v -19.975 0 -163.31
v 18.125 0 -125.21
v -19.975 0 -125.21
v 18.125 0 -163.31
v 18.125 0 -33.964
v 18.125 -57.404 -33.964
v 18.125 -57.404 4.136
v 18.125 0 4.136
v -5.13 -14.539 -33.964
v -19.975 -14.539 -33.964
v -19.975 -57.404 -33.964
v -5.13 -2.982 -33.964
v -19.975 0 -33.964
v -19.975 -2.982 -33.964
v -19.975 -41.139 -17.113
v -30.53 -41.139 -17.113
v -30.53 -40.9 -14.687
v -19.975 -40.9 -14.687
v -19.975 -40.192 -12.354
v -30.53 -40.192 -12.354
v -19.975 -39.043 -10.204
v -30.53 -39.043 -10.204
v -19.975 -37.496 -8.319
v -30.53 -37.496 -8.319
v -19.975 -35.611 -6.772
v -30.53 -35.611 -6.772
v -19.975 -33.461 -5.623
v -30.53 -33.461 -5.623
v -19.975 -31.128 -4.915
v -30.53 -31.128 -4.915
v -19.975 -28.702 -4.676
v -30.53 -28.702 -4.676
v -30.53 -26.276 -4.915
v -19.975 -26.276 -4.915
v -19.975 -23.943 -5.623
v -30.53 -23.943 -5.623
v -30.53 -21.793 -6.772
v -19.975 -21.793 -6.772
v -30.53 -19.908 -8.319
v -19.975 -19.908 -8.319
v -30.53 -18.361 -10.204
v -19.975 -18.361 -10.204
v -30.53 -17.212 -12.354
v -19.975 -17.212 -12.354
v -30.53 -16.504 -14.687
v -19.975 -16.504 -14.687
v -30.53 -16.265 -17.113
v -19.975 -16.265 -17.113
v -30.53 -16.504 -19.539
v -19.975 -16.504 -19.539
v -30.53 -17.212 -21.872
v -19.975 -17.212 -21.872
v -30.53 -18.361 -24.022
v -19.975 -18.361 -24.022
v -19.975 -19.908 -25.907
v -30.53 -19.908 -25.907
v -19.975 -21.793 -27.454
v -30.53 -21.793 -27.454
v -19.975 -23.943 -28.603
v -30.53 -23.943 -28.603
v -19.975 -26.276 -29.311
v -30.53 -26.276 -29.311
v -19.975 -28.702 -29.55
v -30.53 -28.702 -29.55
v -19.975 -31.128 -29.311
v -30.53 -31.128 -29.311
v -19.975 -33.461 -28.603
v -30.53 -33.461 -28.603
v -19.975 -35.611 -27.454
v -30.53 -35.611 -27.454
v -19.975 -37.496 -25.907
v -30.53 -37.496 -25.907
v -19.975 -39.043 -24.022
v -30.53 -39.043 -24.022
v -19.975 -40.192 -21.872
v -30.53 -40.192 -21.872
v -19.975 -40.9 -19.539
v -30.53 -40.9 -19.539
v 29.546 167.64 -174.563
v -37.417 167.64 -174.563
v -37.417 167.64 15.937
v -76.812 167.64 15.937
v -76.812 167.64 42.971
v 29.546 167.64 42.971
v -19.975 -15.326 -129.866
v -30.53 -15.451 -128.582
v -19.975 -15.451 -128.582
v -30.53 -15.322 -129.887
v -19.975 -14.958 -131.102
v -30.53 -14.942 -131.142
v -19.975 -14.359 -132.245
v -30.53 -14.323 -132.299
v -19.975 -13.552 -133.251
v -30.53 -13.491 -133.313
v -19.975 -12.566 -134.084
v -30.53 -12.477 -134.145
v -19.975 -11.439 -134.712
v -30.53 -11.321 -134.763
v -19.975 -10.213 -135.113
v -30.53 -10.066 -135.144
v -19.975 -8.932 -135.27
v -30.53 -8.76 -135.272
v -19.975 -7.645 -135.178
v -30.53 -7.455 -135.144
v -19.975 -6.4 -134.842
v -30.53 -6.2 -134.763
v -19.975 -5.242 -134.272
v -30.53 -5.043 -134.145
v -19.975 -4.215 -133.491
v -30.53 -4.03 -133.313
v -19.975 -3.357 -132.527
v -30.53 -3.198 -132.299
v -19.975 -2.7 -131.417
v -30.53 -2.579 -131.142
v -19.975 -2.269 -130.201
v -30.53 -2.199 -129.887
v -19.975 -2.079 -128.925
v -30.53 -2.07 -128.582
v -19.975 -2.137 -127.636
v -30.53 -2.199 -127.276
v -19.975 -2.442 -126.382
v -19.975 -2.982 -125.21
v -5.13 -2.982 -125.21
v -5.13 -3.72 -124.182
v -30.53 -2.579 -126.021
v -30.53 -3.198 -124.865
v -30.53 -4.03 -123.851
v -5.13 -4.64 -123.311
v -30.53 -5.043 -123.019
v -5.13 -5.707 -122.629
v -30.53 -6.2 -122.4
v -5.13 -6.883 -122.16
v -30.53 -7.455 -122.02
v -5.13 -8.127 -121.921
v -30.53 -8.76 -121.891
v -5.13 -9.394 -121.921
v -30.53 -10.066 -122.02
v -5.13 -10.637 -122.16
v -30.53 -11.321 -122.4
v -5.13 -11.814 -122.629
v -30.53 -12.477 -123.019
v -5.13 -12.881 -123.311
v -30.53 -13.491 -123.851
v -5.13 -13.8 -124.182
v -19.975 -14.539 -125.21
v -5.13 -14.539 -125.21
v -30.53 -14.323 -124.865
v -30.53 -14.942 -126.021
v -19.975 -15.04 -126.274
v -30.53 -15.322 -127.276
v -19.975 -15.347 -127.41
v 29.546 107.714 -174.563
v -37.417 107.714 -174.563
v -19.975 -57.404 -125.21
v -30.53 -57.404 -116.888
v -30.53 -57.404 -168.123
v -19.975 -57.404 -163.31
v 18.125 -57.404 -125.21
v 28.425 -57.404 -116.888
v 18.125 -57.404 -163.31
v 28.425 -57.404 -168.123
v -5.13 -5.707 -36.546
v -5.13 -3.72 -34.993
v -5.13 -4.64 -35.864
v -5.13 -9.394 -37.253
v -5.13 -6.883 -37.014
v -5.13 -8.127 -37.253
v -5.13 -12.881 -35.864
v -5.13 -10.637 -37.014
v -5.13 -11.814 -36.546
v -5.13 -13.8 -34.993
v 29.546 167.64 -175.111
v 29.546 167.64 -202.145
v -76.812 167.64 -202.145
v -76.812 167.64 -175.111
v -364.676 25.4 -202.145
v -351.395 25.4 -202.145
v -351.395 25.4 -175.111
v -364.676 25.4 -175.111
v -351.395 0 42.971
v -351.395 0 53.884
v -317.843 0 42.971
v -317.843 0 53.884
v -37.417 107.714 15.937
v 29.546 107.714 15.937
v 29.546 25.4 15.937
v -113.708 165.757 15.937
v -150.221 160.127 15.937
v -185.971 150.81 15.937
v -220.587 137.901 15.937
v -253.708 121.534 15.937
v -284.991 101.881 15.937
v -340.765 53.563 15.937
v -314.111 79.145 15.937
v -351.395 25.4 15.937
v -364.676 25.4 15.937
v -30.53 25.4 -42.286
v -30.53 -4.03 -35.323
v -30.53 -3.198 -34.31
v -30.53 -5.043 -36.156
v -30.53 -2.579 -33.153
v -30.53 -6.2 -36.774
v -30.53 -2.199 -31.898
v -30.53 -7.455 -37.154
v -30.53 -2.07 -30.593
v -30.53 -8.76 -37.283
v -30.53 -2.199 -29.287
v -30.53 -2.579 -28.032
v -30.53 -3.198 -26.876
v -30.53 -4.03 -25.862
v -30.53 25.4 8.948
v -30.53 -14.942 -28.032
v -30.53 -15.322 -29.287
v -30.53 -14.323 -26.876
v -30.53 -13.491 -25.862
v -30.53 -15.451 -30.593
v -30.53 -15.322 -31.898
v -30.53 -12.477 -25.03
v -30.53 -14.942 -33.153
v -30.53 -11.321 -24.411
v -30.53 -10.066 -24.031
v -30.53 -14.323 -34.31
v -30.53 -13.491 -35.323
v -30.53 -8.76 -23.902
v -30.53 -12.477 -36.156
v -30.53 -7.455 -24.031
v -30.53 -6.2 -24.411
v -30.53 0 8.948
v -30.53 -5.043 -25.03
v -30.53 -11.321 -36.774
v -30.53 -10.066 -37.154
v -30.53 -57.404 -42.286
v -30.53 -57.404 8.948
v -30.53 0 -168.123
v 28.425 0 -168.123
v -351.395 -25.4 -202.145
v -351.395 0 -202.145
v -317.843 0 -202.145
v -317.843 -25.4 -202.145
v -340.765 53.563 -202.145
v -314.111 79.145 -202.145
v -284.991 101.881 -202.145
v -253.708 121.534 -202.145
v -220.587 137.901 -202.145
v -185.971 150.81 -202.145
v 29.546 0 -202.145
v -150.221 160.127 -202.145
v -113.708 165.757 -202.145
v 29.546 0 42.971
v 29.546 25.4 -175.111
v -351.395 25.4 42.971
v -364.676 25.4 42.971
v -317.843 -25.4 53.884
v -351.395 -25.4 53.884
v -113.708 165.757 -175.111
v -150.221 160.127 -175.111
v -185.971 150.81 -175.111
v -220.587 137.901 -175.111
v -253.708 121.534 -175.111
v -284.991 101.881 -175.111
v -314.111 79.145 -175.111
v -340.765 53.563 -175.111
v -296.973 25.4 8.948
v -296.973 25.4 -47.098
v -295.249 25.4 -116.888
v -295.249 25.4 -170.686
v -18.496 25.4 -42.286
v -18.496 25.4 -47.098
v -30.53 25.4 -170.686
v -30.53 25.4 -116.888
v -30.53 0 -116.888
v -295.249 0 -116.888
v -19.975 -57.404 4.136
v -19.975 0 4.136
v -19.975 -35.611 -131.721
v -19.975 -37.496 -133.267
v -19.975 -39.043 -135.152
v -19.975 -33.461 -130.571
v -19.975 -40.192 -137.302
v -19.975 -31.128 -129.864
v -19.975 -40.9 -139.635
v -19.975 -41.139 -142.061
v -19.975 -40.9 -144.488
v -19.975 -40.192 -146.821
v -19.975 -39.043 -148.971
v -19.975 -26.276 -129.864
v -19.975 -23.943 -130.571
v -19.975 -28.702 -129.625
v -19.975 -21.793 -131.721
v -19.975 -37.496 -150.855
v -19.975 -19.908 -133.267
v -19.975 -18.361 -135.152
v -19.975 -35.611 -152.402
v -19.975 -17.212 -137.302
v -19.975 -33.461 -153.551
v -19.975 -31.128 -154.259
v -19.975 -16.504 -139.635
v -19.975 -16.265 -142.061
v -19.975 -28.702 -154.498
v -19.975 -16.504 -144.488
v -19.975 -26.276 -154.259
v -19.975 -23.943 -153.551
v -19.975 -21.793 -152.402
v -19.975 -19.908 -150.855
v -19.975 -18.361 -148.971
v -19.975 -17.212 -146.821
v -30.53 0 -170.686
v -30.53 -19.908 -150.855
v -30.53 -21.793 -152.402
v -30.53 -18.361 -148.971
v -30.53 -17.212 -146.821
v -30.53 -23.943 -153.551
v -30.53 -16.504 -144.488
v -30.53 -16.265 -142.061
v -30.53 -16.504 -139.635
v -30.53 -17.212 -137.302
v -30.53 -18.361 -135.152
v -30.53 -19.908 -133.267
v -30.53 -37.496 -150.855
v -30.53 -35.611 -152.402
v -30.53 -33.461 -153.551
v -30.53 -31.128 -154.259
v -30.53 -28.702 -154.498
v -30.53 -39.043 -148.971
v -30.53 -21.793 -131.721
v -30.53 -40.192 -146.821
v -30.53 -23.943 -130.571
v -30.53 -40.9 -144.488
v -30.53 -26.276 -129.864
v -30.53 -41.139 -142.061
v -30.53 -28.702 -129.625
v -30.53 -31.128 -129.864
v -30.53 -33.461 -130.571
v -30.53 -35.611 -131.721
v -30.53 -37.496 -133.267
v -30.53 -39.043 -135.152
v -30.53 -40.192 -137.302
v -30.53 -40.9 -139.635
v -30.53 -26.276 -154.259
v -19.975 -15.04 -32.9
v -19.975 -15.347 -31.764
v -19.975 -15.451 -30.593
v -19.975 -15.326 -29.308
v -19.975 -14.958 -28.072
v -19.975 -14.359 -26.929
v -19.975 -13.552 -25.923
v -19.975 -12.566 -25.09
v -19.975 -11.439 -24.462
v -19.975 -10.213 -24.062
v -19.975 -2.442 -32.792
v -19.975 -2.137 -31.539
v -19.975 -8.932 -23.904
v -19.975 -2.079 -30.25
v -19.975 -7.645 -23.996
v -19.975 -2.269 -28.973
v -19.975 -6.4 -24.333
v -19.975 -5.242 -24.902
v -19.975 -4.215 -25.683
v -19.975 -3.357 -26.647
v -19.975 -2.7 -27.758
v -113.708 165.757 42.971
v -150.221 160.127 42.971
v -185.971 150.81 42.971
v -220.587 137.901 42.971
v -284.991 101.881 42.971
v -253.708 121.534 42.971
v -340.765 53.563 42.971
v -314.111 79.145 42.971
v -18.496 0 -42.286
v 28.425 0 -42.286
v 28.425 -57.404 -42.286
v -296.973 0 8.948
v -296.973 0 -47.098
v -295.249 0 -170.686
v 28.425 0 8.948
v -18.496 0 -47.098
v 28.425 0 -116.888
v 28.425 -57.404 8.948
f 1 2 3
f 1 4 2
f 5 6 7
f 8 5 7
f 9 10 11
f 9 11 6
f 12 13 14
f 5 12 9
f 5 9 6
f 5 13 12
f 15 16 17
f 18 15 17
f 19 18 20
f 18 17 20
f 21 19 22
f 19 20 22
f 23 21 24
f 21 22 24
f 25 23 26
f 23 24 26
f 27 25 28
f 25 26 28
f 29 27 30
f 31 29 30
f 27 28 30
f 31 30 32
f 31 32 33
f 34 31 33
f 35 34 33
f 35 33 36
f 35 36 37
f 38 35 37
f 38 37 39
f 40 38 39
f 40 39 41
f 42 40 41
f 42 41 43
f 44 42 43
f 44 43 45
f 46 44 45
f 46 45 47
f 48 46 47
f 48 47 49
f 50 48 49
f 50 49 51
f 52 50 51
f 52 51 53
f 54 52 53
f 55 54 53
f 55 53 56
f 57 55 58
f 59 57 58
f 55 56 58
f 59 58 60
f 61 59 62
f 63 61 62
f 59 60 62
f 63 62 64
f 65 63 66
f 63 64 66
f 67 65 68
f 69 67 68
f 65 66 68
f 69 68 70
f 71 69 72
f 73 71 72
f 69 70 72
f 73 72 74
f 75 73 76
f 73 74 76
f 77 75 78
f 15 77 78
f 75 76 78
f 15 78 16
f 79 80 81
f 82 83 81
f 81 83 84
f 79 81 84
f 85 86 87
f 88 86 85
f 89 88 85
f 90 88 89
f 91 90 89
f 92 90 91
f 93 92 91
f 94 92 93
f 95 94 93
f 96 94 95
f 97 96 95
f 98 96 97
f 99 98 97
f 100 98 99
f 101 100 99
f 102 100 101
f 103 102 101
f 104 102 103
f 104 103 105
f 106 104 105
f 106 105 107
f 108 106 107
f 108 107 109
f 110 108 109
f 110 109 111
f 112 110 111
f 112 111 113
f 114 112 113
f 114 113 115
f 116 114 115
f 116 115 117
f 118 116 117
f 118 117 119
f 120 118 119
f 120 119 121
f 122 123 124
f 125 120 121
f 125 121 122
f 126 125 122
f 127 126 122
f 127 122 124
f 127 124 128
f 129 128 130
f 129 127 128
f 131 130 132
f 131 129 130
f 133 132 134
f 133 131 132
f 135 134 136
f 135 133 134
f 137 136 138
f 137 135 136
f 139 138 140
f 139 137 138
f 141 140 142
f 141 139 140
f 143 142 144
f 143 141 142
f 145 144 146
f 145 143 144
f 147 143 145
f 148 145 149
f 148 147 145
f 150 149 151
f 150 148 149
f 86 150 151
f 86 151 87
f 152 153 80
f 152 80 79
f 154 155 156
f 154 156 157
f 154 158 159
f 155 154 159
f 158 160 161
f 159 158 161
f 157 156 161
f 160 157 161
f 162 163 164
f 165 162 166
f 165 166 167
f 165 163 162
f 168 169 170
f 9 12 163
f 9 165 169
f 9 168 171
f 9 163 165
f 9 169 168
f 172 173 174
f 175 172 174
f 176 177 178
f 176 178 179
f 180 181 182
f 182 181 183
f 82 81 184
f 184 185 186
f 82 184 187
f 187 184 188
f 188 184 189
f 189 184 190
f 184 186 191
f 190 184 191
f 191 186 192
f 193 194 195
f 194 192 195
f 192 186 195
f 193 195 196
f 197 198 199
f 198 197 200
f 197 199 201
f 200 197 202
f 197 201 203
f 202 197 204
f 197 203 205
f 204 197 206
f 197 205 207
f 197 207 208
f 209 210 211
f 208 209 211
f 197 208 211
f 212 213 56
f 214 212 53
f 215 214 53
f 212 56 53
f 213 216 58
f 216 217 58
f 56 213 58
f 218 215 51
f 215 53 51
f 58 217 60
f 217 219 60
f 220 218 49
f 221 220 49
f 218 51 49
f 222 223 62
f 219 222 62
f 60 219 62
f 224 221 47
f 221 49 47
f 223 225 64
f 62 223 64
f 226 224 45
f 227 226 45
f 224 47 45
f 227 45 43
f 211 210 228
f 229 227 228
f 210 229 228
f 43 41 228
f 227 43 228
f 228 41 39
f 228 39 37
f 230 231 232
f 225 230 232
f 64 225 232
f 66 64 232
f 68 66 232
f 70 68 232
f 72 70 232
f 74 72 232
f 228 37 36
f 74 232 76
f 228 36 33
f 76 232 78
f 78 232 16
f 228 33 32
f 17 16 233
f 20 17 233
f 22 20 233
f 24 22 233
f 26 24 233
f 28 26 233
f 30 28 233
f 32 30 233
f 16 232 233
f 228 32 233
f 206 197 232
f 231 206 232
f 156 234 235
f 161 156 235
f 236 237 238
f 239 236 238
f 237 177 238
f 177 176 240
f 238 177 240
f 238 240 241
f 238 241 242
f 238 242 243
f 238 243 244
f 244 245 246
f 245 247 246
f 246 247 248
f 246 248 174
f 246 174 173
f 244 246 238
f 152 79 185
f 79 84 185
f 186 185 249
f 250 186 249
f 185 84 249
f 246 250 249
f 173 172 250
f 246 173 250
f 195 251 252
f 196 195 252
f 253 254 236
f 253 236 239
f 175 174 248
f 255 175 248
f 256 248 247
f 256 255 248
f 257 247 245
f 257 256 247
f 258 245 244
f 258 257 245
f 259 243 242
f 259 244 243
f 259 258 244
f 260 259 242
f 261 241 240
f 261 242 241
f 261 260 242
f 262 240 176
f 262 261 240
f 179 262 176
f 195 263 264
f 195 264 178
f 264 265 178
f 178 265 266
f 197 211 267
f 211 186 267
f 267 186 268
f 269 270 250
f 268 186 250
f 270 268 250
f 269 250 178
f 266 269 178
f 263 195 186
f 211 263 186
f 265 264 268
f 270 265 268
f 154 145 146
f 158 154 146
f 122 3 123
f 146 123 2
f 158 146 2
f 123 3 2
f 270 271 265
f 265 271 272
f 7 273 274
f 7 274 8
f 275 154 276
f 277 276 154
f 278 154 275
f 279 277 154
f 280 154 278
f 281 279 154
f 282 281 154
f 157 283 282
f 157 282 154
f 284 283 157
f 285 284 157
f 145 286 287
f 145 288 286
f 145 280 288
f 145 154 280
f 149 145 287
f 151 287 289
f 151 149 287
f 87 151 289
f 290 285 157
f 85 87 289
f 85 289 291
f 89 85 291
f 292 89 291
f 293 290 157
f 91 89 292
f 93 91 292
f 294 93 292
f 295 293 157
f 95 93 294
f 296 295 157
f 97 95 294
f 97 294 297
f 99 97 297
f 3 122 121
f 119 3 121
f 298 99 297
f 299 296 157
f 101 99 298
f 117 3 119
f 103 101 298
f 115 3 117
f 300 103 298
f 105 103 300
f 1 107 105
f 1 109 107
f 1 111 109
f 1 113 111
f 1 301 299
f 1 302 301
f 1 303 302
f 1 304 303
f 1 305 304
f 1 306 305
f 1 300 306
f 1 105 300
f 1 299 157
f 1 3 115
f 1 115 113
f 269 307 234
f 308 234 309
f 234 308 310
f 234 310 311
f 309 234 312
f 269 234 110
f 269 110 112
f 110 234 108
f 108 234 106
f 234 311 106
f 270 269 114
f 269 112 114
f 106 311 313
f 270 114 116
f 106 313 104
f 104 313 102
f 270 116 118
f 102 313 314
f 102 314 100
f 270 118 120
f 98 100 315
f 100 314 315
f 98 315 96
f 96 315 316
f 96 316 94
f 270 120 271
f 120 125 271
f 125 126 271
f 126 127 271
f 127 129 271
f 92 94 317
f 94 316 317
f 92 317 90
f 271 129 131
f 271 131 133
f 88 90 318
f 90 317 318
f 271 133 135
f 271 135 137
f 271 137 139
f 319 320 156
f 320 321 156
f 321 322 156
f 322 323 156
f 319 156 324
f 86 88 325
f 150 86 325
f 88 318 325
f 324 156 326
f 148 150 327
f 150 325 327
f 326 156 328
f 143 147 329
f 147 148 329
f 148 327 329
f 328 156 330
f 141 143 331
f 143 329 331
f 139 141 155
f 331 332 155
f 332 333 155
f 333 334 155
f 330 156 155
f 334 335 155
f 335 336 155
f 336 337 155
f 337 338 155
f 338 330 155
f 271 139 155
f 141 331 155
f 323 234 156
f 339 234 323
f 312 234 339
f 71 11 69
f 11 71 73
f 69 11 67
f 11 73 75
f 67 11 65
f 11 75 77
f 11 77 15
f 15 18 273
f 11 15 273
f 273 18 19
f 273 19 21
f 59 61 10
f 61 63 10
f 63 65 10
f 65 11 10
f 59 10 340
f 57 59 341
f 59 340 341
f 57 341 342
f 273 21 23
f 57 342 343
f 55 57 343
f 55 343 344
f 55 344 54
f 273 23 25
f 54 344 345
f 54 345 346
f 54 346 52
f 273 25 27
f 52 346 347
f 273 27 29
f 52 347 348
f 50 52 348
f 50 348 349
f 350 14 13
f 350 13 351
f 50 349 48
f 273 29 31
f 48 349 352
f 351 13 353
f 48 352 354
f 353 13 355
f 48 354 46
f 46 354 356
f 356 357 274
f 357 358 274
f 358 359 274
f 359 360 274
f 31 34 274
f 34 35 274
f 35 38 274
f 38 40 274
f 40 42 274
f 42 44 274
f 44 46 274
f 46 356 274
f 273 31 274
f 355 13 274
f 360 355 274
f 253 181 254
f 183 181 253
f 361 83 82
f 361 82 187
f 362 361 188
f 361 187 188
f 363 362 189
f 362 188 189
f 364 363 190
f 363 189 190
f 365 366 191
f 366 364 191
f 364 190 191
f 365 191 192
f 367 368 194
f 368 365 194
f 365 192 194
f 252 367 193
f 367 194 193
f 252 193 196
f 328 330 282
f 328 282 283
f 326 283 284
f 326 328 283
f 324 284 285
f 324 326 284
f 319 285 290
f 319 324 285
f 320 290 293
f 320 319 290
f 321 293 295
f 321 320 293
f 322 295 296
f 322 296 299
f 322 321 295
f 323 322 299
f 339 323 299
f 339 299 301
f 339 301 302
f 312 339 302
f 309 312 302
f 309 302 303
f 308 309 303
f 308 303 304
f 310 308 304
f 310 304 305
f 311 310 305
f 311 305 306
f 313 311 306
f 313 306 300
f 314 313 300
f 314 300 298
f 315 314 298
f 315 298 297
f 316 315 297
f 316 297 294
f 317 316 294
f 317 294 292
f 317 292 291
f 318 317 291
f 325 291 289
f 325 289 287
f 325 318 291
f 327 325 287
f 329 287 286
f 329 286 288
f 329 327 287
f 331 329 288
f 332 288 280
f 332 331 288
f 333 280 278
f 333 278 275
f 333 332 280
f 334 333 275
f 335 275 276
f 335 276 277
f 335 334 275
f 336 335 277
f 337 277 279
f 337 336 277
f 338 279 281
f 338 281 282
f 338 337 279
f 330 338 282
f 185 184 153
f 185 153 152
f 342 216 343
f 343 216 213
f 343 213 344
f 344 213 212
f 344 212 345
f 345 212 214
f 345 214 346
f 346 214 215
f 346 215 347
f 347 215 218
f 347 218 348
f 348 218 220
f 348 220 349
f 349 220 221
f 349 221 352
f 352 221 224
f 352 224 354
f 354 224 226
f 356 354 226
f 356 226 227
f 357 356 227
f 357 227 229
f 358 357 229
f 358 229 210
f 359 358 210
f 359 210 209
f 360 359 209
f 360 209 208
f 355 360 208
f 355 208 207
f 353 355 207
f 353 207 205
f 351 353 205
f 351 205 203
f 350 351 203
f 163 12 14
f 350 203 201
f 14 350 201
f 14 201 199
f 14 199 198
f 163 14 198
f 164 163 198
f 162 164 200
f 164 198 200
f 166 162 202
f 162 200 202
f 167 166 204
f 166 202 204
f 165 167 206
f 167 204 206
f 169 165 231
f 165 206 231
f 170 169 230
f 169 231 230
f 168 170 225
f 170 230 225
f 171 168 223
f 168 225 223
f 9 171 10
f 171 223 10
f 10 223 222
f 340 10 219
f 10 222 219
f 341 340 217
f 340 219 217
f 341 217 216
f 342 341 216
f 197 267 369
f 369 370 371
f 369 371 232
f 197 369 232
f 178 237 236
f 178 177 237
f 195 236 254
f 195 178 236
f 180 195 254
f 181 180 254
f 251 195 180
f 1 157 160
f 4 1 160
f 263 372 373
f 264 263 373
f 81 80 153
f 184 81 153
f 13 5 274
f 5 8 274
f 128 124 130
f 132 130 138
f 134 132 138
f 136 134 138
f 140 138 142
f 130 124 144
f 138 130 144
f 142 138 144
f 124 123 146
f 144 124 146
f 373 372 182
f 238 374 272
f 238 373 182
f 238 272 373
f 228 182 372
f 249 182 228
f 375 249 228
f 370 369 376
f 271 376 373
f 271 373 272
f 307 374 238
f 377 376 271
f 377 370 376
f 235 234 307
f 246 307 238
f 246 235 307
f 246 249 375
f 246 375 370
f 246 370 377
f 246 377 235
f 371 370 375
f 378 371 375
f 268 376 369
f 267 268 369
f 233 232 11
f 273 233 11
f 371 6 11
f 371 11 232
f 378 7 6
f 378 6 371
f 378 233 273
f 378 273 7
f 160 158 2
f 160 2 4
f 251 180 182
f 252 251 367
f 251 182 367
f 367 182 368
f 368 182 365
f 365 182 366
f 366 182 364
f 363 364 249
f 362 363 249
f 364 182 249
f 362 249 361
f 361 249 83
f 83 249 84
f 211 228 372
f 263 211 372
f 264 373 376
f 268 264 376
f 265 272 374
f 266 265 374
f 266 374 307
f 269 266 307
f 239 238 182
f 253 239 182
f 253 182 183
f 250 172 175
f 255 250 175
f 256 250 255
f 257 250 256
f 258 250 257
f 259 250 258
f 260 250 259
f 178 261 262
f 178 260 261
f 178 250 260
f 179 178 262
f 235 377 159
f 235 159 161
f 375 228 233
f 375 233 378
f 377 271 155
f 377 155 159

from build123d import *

# Parameters (mm, degrees)
F0_W         = 58.9547399431
F0_H         = 51.2344771996
F0_W_2       = 38.1
F0_H_2       = 38.1
F1_DEPTH     = 57.404
F2_R         = 12.4366404678
F3_DEPTH     = 25.4
F4_W         = 104.0811147541
F4_H         = 122.5580200553
F5_DEPTH     = 25.4
F6_DEPTH     = 25.4
F7_R         = 6.690453714
F8_DEPTH     = 25.4
F9_W         = 129.4811147541
F9_H         = 27.0336512476
F9_W_2       = 264.7406511664
F10_DEPTH    = 142.24
F11_T1_DEPTH = 1466.3511823856
F12_DEPTH    = 251.46
F16_W        = 33.5519401288
F16_H        = 256.0288235545
F17_DEPTH    = 25.4
F19_DEPTH    = 25.4
F20_W        = 66.9628661126
F20_H        = 59.9260473394
F21_DEPTH    = 190.5


# Not quite as in the source:
# - a fillet or chamfer that OpenCascade refuses, or shapes differently, is made with other operations: its cross-section is extruded or revolved along the edge and cut away or added
# - a feature of the source that left no trace in its solid (it failed there, or was rolled back) is left out


with BuildPart() as f1:
    # F0 (on Front) → F1 (new body)
    with BuildSketch(Plane.XZ):
        with Locations((-1.0527623817, -16.6687513702)):
            Rectangle(F0_W, F0_H)
        with Locations((-0.9248415082, -14.9141447619)):
            Rectangle(F0_W_2, F0_H_2, mode=Mode.SUBTRACT)
    extrude(amount=F1_DEPTH)

    # F2 (on face) → F3 (cut)
    with BuildSketch(Plane(origin=(-30.5301323533, 0, 0), x_dir=(0, -1, 0), z_dir=(-1, 0, 0))):
        with Locations((28.702, -17.1130020171)):
            Circle(F2_R)
    extrude(amount=-F3_DEPTH, mode=Mode.SUBTRACT)

    # F4 (on face) → F5 (join)
    with BuildSketch(Plane(origin=(0, 0, 0), x_dir=(-1, 0, 0), z_dir=(0, 1, 0))):
        with Locations((22.4943133071, -18.3081142604)):
            Rectangle(F4_W, F4_H)
    extrude(amount=F5_DEPTH)

    # F6 (add): a face of the model
    f6_faces = [f1.faces().sort_by_distance(p)[0] for p in [
        (-74.5348706841, 12.7, -18.3081142604),
    ]]
    extrude(f6_faces, amount=F6_DEPTH)

    # F7 (on face) → F8 (cut)
    with BuildSketch(Plane(origin=(-30.5301323533, 0, 0), x_dir=(0, -1, 0), z_dir=(-1, 0, 0))):
        with Locations((8.7604233995, -30.5925961584)):
            Circle(F7_R)
    extrude(amount=-F8_DEPTH, mode=Mode.SUBTRACT)

    # F9 (on face) → F10 (join)
    with BuildSketch(Plane(origin=(0, 25.4, 0), x_dir=(-1, 0, 0), z_dir=(0, 1, 0))):
        with Locations((35.1943133071, 29.4540701434)):
            Rectangle(F9_W, F9_H)
        with Locations((232.3051962674, 29.4540701434)):
            Rectangle(F9_W_2, F9_H)
    extrude(amount=F10_DEPTH)

    # F11: fillet of radius 362.4072547021 on 1 edges, made by hand

    # F11_s2 → F11_t1 (cut)
    with BuildSketch(Plane.XY.offset(-703.7215210494)):
        with BuildLine():
            ThreePointArc((-76.812015623, 167.64), (-237.3561028838, 130.139830949), (-364.6755218506, 25.4))
            Line((-364.6755218506, 25.4), (-364.6755218506, 167.64))
            Line((-364.6755218506, 167.64), (-76.812015623, 167.64))
        make_face()
    extrude(amount=F11_T1_DEPTH, mode=Mode.SUBTRACT)

    # F12 (add): a face of the model
    f12_faces = [f1.faces().sort_by_distance(p)[0] for p in [
        (-99.9348706841, 12.7, -18.3081142604),
    ]]
    extrude(f12_faces, amount=F12_DEPTH)

    # F15: F1 across face


with BuildPart() as f1_1:
    add(f1.part)
    add(f1.part.mirror(Plane(origin=(-160.9243133071, 12.7, -79.5871242881), x_dir=(1, 0, 0), z_dir=(0, 0, -1))))

    # F16 (on face) → F17 (join)
    with BuildSketch(Plane.XZ):
        with Locations((-334.6189006197, -74.1307325661)):
            Rectangle(F16_W, F16_H)
    extrude(amount=F17_DEPTH)

    # F18 (on face) → F19 (cut)
    with BuildSketch(Plane.XZ):
        Polygon((-295.2485382557, -116.8882586062), (-295.2485382557, -170.68554461), (-30.5301323533, -170.68554461), (-30.5301323533, -168.1227358058), (-30.5301323533, -116.8882586062), align=None)
        Polygon((-296.9728708267, 8.9484872296), (-296.9728708267, -47.0983237028), (-18.4958036989, -47.0983237028), (-18.4958036989, -42.28598997), (-30.5301323533, -42.28598997), (-30.5301323533, 8.9484872296), align=None)
    extrude(amount=-F19_DEPTH, mode=Mode.SUBTRACT)

    # F20 (on face) → F21 (join)
    with BuildSketch(Plane(origin=(0, 0, 15.9372445196), x_dir=(1, 0, 0), z_dir=(0, 0, -1))):
        with Locations((-3.9351889864, -137.6769763303)):
            Rectangle(F20_W, F20_H)
    extrude(amount=F21_DEPTH)


solid = f1_1.part
